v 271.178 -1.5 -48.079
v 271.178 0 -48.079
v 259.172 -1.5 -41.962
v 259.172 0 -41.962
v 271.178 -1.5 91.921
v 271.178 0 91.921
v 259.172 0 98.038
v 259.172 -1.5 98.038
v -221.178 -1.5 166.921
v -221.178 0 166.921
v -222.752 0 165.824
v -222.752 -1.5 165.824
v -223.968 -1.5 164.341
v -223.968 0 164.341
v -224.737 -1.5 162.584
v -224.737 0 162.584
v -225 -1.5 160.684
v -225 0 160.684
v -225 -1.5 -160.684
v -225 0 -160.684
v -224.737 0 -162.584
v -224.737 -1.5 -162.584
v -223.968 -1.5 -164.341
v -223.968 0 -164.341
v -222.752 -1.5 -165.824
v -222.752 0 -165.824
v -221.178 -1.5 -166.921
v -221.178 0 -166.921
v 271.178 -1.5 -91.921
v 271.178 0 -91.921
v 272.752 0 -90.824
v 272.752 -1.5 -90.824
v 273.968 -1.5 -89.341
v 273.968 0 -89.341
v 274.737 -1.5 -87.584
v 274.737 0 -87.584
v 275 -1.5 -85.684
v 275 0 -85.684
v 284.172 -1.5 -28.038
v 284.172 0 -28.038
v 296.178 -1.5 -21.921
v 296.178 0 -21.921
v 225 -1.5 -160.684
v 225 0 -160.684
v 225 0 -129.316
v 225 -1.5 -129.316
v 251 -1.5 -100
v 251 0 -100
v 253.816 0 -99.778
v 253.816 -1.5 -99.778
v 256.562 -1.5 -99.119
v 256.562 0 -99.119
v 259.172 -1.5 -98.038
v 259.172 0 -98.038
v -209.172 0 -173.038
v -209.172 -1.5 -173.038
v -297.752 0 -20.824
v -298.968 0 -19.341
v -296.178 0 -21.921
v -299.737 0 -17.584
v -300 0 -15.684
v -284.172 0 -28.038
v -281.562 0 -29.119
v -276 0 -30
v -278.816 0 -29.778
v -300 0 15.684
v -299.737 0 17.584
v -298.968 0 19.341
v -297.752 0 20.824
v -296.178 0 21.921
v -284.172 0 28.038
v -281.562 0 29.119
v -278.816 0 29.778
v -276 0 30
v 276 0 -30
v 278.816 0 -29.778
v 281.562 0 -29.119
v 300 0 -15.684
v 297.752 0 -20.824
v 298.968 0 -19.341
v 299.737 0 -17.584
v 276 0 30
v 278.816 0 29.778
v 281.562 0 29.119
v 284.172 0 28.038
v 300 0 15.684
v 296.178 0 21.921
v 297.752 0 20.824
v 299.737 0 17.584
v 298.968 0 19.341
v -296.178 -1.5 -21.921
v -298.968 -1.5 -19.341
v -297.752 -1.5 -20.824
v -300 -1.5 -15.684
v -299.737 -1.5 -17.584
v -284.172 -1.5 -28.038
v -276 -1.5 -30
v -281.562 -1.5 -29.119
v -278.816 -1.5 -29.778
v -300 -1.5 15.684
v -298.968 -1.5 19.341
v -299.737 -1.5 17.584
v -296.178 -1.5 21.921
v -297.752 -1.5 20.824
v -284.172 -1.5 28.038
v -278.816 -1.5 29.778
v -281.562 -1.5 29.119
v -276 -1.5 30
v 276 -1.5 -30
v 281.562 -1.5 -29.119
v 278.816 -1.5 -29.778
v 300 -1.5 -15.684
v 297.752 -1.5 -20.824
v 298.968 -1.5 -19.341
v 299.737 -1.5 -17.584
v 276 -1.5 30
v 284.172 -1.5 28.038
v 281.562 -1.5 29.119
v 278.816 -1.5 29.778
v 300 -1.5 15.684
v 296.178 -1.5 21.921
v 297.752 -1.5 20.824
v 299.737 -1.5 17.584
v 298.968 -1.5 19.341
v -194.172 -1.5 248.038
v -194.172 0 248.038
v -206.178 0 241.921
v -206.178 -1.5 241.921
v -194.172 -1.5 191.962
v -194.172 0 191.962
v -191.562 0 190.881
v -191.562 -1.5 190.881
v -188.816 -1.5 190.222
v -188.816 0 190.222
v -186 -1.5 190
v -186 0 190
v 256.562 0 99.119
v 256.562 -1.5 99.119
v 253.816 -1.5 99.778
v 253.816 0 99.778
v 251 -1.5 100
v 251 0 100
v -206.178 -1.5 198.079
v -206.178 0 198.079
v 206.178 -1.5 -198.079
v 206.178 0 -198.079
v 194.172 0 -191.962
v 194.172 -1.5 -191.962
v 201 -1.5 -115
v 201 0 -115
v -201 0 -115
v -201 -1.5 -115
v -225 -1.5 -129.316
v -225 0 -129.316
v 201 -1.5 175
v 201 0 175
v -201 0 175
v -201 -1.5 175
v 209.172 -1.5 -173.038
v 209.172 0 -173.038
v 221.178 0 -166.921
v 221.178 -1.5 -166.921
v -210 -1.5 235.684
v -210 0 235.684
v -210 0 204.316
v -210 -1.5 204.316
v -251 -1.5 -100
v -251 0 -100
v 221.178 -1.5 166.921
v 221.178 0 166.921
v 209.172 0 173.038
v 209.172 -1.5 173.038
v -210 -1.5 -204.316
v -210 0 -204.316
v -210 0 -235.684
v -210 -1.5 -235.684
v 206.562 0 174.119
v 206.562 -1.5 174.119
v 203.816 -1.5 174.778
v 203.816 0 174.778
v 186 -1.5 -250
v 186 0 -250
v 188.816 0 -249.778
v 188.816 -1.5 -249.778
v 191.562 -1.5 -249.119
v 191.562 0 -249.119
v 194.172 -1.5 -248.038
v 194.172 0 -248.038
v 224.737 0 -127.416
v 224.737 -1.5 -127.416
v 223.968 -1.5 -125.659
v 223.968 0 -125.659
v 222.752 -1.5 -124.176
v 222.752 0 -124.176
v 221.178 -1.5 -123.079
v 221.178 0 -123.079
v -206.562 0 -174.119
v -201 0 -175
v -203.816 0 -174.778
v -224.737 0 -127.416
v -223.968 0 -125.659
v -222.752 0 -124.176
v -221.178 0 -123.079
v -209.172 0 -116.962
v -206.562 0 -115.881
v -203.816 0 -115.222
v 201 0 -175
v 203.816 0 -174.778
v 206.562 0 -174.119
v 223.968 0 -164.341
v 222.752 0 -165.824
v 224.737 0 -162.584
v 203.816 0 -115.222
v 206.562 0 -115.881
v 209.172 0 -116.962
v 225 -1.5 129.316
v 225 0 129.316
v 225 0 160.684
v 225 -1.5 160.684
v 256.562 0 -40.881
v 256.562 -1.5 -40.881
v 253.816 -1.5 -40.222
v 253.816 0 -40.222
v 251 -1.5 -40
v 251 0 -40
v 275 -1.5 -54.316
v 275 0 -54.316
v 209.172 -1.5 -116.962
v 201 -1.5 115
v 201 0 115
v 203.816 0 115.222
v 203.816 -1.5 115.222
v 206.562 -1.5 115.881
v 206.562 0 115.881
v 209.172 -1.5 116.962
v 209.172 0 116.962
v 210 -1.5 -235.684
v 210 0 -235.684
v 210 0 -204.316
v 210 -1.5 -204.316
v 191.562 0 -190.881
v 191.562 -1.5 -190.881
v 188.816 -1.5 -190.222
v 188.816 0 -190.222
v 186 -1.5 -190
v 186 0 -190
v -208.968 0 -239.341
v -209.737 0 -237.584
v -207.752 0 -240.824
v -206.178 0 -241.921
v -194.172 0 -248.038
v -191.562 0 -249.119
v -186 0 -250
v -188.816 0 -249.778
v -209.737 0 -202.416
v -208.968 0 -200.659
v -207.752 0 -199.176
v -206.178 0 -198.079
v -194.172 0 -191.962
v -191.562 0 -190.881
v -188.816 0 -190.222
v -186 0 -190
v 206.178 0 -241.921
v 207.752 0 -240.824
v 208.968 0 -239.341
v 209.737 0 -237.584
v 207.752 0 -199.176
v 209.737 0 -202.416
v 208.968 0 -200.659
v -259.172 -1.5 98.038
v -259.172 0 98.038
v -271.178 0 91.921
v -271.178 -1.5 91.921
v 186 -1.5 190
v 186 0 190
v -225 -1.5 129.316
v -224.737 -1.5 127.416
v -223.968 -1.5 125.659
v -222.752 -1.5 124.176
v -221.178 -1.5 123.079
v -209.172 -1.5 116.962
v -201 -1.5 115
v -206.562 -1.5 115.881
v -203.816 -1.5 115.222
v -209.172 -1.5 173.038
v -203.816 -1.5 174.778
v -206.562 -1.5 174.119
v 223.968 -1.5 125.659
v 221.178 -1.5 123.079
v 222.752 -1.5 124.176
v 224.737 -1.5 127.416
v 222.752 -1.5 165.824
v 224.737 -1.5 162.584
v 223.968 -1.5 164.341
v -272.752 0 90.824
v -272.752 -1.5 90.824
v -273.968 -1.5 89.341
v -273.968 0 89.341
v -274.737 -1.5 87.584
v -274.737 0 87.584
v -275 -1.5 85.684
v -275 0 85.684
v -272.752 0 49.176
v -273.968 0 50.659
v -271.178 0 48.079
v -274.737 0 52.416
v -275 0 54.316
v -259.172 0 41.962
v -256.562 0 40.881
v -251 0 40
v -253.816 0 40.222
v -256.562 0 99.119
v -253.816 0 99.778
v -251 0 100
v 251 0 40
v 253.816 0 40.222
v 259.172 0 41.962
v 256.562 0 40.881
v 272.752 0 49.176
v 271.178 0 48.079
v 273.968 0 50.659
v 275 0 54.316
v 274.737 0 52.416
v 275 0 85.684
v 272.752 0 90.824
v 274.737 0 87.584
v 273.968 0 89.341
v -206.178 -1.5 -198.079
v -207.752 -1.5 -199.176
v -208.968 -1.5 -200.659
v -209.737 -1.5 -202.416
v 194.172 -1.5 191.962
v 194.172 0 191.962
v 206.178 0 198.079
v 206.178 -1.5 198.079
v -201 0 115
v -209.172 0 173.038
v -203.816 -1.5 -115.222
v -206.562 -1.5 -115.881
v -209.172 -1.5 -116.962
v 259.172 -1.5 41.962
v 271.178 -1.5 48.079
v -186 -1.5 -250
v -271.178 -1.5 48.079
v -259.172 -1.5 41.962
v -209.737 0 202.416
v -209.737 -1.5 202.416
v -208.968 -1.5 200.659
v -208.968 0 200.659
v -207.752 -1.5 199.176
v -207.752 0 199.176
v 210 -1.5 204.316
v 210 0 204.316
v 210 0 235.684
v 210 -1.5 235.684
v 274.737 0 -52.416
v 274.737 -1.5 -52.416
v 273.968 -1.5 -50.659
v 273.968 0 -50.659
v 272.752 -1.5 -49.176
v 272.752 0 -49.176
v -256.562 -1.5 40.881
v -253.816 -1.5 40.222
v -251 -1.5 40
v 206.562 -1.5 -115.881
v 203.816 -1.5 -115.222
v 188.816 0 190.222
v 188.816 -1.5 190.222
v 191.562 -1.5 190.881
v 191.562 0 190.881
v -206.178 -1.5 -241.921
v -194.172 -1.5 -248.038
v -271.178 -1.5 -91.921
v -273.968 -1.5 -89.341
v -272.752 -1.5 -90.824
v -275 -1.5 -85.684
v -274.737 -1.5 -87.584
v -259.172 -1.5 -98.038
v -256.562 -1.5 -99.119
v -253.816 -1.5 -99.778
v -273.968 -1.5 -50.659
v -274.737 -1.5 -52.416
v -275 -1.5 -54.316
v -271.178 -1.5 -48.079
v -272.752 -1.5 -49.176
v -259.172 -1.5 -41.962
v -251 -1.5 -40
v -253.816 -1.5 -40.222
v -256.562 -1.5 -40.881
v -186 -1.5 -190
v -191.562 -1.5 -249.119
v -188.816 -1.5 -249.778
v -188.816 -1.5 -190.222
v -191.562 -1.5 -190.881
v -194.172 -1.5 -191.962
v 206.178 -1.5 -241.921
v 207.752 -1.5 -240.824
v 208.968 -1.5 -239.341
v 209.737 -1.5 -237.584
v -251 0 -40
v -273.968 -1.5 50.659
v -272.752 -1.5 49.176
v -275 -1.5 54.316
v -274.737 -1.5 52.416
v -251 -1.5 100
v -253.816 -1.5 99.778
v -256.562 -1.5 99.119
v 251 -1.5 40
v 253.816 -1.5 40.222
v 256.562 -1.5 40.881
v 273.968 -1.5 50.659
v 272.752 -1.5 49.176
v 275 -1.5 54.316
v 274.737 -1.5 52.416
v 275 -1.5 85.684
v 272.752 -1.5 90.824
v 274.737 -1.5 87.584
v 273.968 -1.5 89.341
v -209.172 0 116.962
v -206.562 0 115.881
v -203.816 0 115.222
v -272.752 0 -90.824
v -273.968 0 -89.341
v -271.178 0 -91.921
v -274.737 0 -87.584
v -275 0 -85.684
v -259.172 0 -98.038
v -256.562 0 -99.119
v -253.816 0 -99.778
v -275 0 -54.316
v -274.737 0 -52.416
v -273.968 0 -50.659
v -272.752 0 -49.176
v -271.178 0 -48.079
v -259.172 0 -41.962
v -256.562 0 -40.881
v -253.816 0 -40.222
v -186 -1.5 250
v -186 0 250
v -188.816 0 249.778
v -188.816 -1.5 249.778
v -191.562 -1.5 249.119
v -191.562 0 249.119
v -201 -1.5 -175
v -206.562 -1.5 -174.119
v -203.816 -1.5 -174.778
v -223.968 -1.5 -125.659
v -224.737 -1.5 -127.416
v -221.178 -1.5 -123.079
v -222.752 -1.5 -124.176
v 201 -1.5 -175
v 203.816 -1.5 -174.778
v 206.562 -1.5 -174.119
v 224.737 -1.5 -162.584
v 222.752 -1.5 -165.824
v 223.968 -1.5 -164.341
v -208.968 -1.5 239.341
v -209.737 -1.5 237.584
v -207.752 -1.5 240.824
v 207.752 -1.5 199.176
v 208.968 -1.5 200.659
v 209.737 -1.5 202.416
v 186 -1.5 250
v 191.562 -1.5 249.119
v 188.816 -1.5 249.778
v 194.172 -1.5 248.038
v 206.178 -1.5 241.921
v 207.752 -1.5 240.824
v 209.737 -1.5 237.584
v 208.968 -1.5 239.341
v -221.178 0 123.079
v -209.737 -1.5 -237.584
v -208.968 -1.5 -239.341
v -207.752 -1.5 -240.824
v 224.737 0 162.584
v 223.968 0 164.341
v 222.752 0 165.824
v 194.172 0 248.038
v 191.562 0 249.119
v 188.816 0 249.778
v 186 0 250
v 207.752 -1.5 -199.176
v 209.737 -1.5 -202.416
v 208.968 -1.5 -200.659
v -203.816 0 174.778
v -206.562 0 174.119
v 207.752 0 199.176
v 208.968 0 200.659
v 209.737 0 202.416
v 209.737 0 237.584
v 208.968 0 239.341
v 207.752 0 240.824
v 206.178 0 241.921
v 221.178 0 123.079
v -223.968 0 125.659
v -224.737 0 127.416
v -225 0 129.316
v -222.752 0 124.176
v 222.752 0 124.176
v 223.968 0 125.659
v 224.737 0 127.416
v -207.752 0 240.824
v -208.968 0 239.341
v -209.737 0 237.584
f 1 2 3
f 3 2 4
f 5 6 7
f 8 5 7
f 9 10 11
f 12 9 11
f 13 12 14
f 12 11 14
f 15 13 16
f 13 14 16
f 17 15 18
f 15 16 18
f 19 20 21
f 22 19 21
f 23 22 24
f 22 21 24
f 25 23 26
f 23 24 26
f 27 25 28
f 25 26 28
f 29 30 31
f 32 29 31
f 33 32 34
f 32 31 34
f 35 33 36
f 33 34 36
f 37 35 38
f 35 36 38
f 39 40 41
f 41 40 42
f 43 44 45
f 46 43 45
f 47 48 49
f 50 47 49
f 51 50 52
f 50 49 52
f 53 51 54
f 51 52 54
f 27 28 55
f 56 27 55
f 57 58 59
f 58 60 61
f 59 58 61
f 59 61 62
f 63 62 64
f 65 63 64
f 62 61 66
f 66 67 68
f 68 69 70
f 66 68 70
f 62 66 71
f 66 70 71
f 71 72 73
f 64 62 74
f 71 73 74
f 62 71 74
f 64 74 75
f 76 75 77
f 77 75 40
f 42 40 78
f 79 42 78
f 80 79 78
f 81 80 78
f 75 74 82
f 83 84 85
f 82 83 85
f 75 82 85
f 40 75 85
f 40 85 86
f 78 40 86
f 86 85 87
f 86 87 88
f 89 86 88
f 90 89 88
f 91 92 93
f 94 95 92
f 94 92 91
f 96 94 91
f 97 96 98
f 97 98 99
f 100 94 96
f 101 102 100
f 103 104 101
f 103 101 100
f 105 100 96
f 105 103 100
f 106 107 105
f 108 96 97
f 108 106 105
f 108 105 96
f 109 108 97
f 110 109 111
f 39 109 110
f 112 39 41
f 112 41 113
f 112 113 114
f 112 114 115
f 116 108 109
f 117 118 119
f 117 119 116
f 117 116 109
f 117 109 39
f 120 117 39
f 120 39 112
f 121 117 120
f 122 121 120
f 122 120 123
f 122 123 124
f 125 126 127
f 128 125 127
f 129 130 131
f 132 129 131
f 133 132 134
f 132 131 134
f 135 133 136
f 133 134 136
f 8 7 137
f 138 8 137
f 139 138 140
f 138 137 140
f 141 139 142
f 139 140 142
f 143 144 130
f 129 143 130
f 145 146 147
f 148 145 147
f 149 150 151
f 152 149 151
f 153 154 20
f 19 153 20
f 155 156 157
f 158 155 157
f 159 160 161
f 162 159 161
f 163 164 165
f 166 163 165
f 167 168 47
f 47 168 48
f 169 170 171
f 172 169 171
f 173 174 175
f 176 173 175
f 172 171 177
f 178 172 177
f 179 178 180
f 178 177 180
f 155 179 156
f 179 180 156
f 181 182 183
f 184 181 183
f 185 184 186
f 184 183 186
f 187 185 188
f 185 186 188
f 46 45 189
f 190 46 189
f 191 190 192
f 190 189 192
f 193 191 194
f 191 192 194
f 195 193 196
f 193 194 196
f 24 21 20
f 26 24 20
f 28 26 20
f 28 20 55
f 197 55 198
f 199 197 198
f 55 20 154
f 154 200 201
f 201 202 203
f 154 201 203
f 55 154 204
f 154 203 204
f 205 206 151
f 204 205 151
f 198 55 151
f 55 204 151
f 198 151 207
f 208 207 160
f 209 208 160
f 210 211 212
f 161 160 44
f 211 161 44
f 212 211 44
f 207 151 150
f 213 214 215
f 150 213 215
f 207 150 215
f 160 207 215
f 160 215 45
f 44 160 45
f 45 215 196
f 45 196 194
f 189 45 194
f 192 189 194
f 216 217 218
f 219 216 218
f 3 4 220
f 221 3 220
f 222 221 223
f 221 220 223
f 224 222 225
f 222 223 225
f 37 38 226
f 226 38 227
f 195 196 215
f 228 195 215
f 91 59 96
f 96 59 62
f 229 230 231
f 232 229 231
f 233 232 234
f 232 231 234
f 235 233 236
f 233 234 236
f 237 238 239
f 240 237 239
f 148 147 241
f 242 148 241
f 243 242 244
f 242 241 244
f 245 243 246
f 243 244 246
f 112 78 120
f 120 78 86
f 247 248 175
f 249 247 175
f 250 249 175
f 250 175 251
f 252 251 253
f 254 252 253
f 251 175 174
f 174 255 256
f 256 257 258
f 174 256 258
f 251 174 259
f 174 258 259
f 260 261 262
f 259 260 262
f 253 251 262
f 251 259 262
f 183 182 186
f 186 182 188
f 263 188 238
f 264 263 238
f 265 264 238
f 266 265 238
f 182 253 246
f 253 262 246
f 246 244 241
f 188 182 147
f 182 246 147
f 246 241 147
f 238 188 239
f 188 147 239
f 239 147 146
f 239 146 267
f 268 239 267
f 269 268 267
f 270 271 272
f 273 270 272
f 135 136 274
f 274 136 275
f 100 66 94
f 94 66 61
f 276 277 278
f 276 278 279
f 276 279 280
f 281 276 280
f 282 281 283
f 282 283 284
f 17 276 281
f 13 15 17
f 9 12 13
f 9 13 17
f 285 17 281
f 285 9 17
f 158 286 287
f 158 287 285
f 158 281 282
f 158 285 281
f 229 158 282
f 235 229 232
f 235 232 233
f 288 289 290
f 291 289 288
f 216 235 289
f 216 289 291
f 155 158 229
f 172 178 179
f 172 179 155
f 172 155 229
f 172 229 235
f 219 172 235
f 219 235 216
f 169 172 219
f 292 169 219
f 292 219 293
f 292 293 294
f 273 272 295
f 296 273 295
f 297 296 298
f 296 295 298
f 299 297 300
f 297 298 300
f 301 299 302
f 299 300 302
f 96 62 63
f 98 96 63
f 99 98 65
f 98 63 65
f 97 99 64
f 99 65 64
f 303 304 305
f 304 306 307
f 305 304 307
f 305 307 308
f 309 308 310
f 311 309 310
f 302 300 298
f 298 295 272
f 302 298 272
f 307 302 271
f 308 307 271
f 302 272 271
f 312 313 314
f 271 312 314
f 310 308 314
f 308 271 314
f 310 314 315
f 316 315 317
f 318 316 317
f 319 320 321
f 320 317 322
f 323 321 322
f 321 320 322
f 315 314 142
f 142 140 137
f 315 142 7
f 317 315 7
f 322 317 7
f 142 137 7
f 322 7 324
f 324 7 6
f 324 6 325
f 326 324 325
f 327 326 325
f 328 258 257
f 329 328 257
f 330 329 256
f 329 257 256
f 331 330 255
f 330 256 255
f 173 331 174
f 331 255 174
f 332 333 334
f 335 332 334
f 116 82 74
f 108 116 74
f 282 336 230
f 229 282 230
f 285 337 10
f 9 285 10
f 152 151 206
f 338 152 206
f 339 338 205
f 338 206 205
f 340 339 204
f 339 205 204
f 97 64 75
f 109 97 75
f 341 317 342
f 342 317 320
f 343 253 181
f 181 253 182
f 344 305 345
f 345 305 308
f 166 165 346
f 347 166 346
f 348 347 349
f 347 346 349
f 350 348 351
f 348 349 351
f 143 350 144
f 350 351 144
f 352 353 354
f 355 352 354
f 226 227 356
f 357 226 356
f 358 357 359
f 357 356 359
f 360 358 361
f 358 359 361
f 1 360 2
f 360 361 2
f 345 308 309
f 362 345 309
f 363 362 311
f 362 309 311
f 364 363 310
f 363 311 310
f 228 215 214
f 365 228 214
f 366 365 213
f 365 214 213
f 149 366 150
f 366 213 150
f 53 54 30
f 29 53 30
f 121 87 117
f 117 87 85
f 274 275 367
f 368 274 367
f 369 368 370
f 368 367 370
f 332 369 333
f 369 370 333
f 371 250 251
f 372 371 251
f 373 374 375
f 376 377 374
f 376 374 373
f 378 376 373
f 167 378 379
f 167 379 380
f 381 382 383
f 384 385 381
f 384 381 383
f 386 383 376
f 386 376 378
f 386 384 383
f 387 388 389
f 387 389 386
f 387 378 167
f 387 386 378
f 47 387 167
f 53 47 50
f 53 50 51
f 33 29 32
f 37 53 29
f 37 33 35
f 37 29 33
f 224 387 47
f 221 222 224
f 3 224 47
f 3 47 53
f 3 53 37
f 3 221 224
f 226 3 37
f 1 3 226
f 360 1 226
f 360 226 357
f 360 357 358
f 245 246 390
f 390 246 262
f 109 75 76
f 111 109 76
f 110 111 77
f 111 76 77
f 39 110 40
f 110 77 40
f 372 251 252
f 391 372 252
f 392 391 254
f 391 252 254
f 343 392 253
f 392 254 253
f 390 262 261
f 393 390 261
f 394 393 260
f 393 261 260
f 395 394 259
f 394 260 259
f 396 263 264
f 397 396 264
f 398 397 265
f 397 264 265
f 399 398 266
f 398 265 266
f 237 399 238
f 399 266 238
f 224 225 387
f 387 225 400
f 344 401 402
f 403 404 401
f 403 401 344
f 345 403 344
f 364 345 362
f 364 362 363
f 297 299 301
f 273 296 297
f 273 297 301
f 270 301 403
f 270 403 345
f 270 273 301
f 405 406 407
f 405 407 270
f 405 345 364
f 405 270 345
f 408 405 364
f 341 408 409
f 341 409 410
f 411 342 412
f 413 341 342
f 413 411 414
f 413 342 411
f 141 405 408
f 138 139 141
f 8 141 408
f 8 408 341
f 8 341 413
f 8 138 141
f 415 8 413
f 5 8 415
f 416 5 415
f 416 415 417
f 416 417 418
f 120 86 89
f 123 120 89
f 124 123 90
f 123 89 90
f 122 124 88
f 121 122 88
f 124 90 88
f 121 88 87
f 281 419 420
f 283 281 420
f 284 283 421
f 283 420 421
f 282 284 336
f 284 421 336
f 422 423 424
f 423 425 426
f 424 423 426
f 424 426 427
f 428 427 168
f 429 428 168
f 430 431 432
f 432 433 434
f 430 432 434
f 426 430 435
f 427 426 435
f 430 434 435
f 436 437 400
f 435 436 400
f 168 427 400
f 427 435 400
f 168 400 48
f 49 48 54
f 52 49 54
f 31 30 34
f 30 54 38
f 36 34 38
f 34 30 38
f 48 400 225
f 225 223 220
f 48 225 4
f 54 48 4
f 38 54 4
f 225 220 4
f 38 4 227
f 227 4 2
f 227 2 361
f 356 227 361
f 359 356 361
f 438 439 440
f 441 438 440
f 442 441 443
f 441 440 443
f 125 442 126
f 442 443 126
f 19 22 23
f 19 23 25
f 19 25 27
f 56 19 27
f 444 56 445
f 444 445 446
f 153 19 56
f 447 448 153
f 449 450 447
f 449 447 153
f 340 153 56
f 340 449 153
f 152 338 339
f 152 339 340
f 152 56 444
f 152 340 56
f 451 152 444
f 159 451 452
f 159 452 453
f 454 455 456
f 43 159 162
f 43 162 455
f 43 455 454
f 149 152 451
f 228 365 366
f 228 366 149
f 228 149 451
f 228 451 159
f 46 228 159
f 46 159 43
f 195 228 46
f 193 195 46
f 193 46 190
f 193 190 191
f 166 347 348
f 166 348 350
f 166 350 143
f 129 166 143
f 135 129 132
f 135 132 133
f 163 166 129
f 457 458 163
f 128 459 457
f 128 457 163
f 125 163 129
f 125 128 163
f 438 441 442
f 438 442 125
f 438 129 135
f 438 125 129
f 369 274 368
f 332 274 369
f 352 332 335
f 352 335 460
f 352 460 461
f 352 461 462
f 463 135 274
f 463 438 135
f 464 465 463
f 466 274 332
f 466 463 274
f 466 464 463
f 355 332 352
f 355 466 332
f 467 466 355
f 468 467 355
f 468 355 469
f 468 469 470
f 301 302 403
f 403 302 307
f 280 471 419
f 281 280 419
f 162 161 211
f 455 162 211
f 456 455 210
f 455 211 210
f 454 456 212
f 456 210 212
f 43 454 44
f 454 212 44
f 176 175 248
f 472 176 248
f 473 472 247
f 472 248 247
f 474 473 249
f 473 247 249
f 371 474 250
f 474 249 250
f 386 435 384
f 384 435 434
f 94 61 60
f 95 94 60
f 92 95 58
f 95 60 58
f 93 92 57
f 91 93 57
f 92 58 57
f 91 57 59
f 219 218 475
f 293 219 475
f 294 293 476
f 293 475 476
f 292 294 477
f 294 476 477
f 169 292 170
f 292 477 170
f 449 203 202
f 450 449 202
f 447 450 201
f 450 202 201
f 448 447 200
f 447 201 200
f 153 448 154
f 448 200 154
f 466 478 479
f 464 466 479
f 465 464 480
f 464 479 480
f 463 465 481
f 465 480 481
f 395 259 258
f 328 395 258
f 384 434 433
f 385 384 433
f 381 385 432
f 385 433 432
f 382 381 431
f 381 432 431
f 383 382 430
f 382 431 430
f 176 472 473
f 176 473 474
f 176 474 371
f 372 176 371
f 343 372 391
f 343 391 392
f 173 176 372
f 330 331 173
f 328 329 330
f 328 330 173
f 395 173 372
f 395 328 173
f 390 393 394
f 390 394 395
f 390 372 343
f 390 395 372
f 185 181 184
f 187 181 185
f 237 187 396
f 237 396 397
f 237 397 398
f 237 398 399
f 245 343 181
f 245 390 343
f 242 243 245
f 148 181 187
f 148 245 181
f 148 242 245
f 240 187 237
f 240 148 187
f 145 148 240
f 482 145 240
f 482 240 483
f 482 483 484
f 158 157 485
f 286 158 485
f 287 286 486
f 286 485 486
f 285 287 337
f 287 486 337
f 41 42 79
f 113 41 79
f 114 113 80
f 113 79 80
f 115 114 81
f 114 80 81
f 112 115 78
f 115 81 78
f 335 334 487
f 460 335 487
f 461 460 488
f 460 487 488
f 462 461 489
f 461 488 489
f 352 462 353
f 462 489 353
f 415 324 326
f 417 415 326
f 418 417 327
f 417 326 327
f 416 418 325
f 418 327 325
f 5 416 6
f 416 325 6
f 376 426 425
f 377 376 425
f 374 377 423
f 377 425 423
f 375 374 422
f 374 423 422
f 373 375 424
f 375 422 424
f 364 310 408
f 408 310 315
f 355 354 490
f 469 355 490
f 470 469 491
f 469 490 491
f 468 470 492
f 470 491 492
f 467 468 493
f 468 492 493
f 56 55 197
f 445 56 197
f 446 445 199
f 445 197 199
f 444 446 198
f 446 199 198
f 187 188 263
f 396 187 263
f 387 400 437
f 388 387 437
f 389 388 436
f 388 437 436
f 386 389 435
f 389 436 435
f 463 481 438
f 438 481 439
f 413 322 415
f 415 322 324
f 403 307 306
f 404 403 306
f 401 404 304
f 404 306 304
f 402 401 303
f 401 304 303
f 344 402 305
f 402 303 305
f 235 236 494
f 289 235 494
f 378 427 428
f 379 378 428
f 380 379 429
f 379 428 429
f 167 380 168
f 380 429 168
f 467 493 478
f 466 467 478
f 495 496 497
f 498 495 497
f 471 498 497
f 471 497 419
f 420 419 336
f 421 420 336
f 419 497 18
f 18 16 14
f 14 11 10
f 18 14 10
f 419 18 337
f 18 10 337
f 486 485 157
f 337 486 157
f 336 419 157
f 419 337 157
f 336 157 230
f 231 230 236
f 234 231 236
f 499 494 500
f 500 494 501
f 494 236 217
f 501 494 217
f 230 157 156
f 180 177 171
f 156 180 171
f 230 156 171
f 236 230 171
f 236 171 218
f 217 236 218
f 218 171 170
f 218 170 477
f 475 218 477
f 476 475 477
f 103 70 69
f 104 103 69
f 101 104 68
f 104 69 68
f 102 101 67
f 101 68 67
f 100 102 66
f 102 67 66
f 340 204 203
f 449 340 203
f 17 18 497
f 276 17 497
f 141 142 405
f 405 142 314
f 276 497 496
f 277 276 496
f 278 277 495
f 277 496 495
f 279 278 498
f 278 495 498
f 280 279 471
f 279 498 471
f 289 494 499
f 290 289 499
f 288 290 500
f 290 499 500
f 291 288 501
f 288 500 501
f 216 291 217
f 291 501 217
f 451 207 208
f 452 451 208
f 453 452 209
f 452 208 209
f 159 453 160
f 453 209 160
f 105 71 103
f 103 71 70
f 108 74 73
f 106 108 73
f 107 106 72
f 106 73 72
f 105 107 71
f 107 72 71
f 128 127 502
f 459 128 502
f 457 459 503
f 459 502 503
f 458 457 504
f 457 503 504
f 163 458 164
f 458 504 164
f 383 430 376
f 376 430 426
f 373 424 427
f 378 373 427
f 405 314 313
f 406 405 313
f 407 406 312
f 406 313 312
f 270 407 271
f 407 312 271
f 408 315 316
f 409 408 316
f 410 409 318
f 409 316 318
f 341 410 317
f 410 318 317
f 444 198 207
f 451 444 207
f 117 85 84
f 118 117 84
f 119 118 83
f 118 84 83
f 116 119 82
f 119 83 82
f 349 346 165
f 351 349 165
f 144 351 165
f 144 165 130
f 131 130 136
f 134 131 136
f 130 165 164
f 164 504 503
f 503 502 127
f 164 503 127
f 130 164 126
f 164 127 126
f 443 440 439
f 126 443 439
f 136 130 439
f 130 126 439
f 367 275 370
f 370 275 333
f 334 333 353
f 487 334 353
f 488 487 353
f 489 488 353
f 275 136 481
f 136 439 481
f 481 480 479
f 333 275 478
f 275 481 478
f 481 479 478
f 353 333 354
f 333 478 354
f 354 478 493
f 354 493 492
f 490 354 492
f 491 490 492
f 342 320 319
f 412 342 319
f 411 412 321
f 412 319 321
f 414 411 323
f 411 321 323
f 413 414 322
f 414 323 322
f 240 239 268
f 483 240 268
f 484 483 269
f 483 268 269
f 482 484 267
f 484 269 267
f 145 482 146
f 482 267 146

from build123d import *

# Parameters (mm, degrees)
F1_DEPTH = 1.5


with BuildPart() as f1:
    # F0 (on Front) → F1 (new body)
    with BuildSketch(Plane.XZ):
        with BuildLine():
            ThreePointArc((-276, 30), (-280.202017, 29.502659), (-284.171829, 28.038117))
            Line((-284.171829, 28.038117), (-296.177933, 21.920702))
            ThreePointArc((-296.177933, 21.920702), (-298.968481, 19.341146), (-300, 15.683656))
            Line((-300, 15.683656), (-300, 0))
            Line((-300, 0), (-300, -15.683656))
            ThreePointArc((-300, -15.683656), (-298.968481, -19.341146), (-296.177933, -21.920702))
            Line((-296.177933, -21.920702), (-284.171829, -28.038117))
            ThreePointArc((-284.171829, -28.038117), (-280.202017, -29.502659), (-276, -30))
            Line((-276, -30), (0, -30))
            Line((0, -30), (276, -30))
            ThreePointArc((276, -30), (280.202017, -29.502659), (284.171829, -28.038117))
            Line((284.171829, -28.038117), (296.177933, -21.920702))
            ThreePointArc((296.177933, -21.920702), (298.968481, -19.341146), (300, -15.683656))
            Line((300, -15.683656), (300, 0))
            Line((300, 0), (300, 15.683656))
            ThreePointArc((300, 15.683656), (298.968481, 19.341146), (296.177933, 21.920702))
            Line((296.177933, 21.920702), (284.171829, 28.038117))
            ThreePointArc((284.171829, 28.038117), (280.202017, 29.502659), (276, 30))
            Line((276, 30), (0, 30))
            Line((0, 30), (-276, 30))
        make_face()
        with BuildLine():
            Line((-259.171829, 98.038117), (-271.177933, 91.920702))
            ThreePointArc((-271.177933, 91.920702), (-273.968481, 89.341146), (-275, 85.683656))
            Line((-275, 85.683656), (-275, 70))
            Line((-275, 70), (-275, 54.316344))
            ThreePointArc((-275, 54.316344), (-273.968481, 50.658854), (-271.177933, 48.079298))
            Line((-271.177933, 48.079298), (-259.171829, 41.961883))
            ThreePointArc((-259.171829, 41.961883), (-255.202017, 40.497341), (-251, 40))
            Line((-251, 40), (0, 40))
            Line((0, 40), (251, 40))
            ThreePointArc((251, 40), (255.202017, 40.497341), (259.171829, 41.961883))
            Line((259.171829, 41.961883), (271.177933, 48.079298))
            ThreePointArc((271.177933, 48.079298), (273.968481, 50.658854), (275, 54.316344))
            Line((275, 54.316344), (275, 70))
            Line((275, 70), (275, 85.683656))
            ThreePointArc((275, 85.683656), (273.968481, 89.341146), (271.177933, 91.920702))
            Line((271.177933, 91.920702), (259.171829, 98.038117))
            ThreePointArc((259.171829, 98.038117), (255.202017, 99.502659), (251, 100))
            Line((251, 100), (0, 100))
            Line((0, 100), (-251, 100))
            ThreePointArc((-251, 100), (-255.202017, 99.502659), (-259.171829, 98.038117))
        make_face()
        with BuildLine():
            ThreePointArc((-225, 129.316344), (-223.968481, 125.658854), (-221.177933, 123.079298))
            Line((-221.177933, 123.079298), (-209.171829, 116.961883))
            ThreePointArc((-209.171829, 116.961883), (-205.202017, 115.497341), (-201, 115))
            Line((-201, 115), (0, 115))
            Line((0, 115), (201, 115))
            ThreePointArc((201, 115), (205.202017, 115.497341), (209.171829, 116.961883))
            Line((209.171829, 116.961883), (221.177933, 123.079298))
            ThreePointArc((221.177933, 123.079298), (223.968481, 125.658854), (225, 129.316344))
            Line((225, 129.316344), (225, 145))
            Line((225, 145), (225, 160.683656))
            ThreePointArc((225, 160.683656), (223.968481, 164.341146), (221.177933, 166.920702))
            Line((221.177933, 166.920702), (209.171829, 173.038117))
            ThreePointArc((209.171829, 173.038117), (205.202017, 174.502659), (201, 175))
            Line((201, 175), (0, 175))
            Line((0, 175), (-201, 175))
            ThreePointArc((-201, 175), (-205.202017, 174.502659), (-209.171829, 173.038117))
            Line((-209.171829, 173.038117), (-221.177933, 166.920702))
            ThreePointArc((-221.177933, 166.920702), (-223.968481, 164.341146), (-225, 160.683656))
            Line((-225, 160.683656), (-225, 145))
            Line((-225, 145), (-225, 129.316344))
        make_face()
        with BuildLine():
            ThreePointArc((-251, -40), (-255.202017, -40.497341), (-259.171829, -41.961883))
            Line((-259.171829, -41.961883), (-271.177933, -48.079298))
            ThreePointArc((-271.177933, -48.079298), (-273.968481, -50.658854), (-275, -54.316344))
            Line((-275, -54.316344), (-275, -70))
            Line((-275, -70), (-275, -85.683656))
            ThreePointArc((-275, -85.683656), (-273.968481, -89.341146), (-271.177933, -91.920702))
            Line((-271.177933, -91.920702), (-259.171829, -98.038117))
            ThreePointArc((-259.171829, -98.038117), (-255.202017, -99.502659), (-251, -100))
            Line((-251, -100), (0, -100))
            Line((0, -100), (251, -100))
            ThreePointArc((251, -100), (255.202017, -99.502659), (259.171829, -98.038117))
            Line((259.171829, -98.038117), (271.177933, -91.920702))
            ThreePointArc((271.177933, -91.920702), (273.968481, -89.341146), (275, -85.683656))
            Line((275, -85.683656), (275, -70))
            Line((275, -70), (275, -54.316344))
            ThreePointArc((275, -54.316344), (273.968481, -50.658854), (271.177933, -48.079298))
            Line((271.177933, -48.079298), (259.171829, -41.961883))
            ThreePointArc((259.171829, -41.961883), (255.202017, -40.497341), (251, -40))
            Line((251, -40), (0, -40))
            Line((0, -40), (-251, -40))
        make_face()
        with BuildLine():
            ThreePointArc((-201, -115), (-205.202017, -115.497341), (-209.171829, -116.961883))
            Line((-209.171829, -116.961883), (-221.177933, -123.079298))
            ThreePointArc((-221.177933, -123.079298), (-223.968481, -125.658854), (-225, -129.316344))
            Line((-225, -129.316344), (-225, -145))
            Line((-225, -145), (-225, -160.683656))
            ThreePointArc((-225, -160.683656), (-223.968481, -164.341146), (-221.177933, -166.920702))
            Line((-221.177933, -166.920702), (-209.171829, -173.038117))
            ThreePointArc((-209.171829, -173.038117), (-205.202017, -174.502659), (-201, -175))
            Line((-201, -175), (0, -175))
            Line((0, -175), (201, -175))
            ThreePointArc((201, -175), (205.202017, -174.502659), (209.171829, -173.038117))
            Line((209.171829, -173.038117), (221.177933, -166.920702))
            ThreePointArc((221.177933, -166.920702), (223.968481, -164.341146), (225, -160.683656))
            Line((225, -160.683656), (225, -145))
            Line((225, -145), (225, -129.316344))
            ThreePointArc((225, -129.316344), (223.968481, -125.658854), (221.177933, -123.079298))
            Line((221.177933, -123.079298), (209.171829, -116.961883))
            ThreePointArc((209.171829, -116.961883), (205.202017, -115.497341), (201, -115))
            Line((201, -115), (0, -115))
            Line((0, -115), (-201, -115))
        make_face()
        with BuildLine():
            ThreePointArc((-186, -190), (-190.202017, -190.497341), (-194.171829, -191.961883))
            Line((-194.171829, -191.961883), (-206.177933, -198.079298))
            ThreePointArc((-206.177933, -198.079298), (-208.968481, -200.658854), (-210, -204.316344))
            Line((-210, -204.316344), (-210, -220))
            Line((-210, -220), (-210, -235.683656))
            ThreePointArc((-210, -235.683656), (-208.968481, -239.341146), (-206.177933, -241.920702))
            Line((-206.177933, -241.920702), (-194.171829, -248.038117))
            ThreePointArc((-194.171829, -248.038117), (-190.202017, -249.502659), (-186, -250))
            Line((-186, -250), (0, -250))
            Line((0, -250), (186, -250))
            ThreePointArc((186, -250), (190.202017, -249.502659), (194.171829, -248.038117))
            Line((194.171829, -248.038117), (206.177933, -241.920702))
            ThreePointArc((206.177933, -241.920702), (208.968481, -239.341146), (210, -235.683656))
            Line((210, -235.683656), (210, -220))
            Line((210, -220), (210, -204.316344))
            ThreePointArc((210, -204.316344), (208.968481, -200.658854), (206.177933, -198.079298))
            Line((206.177933, -198.079298), (194.171829, -191.961883))
            ThreePointArc((194.171829, -191.961883), (190.202017, -190.497341), (186, -190))
            Line((186, -190), (0, -190))
            Line((0, -190), (-186, -190))
        make_face()
        with BuildLine():
            Line((-210, 220), (-210, 204.316344))
            ThreePointArc((-210, 204.316344), (-208.968481, 200.658854), (-206.177933, 198.079298))
            Line((-206.177933, 198.079298), (-194.171829, 191.961883))
            ThreePointArc((-194.171829, 191.961883), (-190.202017, 190.497341), (-186, 190))
            Line((-186, 190), (0, 190))
            Line((0, 190), (186, 190))
            ThreePointArc((186, 190), (190.202017, 190.497341), (194.171829, 191.961883))
            Line((194.171829, 191.961883), (206.177933, 198.079298))
            ThreePointArc((206.177933, 198.079298), (208.968481, 200.658854), (210, 204.316344))
            Line((210, 204.316344), (210, 220))
            Line((210, 220), (210, 235.683656))
            ThreePointArc((210, 235.683656), (208.968481, 239.341146), (206.177933, 241.920702))
            Line((206.177933, 241.920702), (194.171829, 248.038117))
            ThreePointArc((194.171829, 248.038117), (190.202017, 249.502659), (186, 250))
            Line((186, 250), (0, 250))
            Line((0, 250), (-186, 250))
            ThreePointArc((-186, 250), (-190.202017, 249.502659), (-194.171829, 248.038117))
            Line((-194.171829, 248.038117), (-206.177933, 241.920702))
            ThreePointArc((-206.177933, 241.920702), (-208.968481, 239.341146), (-210, 235.683656))
            Line((-210, 235.683656), (-210, 220))
        make_face()
    extrude(amount=F1_DEPTH)


solid = f1.part
